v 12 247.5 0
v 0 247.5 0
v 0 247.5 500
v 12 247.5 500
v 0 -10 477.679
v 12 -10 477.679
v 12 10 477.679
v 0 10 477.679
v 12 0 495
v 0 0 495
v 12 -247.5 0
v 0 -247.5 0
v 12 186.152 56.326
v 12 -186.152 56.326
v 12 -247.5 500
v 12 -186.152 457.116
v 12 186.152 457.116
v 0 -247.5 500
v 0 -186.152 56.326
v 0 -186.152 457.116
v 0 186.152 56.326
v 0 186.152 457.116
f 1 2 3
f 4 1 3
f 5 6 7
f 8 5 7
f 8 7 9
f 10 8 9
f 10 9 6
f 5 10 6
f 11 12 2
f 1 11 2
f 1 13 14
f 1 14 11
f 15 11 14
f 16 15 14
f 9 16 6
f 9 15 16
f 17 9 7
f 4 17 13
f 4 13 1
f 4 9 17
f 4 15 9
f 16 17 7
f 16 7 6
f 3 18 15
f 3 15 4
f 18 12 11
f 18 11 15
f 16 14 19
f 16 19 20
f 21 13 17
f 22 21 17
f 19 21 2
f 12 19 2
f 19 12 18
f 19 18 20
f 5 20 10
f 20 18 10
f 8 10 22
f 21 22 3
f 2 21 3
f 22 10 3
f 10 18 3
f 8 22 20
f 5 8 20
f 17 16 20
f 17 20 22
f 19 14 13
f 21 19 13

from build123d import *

# Parameters (mm, degrees)
SKETCH_W     = 495
SKETCH_H     = 500
PAD_DEPTH    = 12
SKETCH001_W  = 372.304686
SKETCH001_H  = 400.790555
POCKET_DEPTH = 12.001


with BuildPart() as part:
    # Sketch → Pad (new body)
    with BuildSketch(Plane.YZ):
        with Locations((0, 250)):
            Rectangle(SKETCH_W, SKETCH_H)
    extrude(amount=PAD_DEPTH)

    # Sketch001 (on Face6 of Pad) → Pocket (cut, through all)
    with BuildSketch(Plane.YZ.offset(12)):
        Polygon((0, 495), (-10, 477.679492), (10, 477.679492), align=None)
        with Locations((0, 256.721156)):
            Rectangle(SKETCH001_W, SKETCH001_H)
    extrude(amount=-POCKET_DEPTH, mode=Mode.SUBTRACT)


solid = part.part
